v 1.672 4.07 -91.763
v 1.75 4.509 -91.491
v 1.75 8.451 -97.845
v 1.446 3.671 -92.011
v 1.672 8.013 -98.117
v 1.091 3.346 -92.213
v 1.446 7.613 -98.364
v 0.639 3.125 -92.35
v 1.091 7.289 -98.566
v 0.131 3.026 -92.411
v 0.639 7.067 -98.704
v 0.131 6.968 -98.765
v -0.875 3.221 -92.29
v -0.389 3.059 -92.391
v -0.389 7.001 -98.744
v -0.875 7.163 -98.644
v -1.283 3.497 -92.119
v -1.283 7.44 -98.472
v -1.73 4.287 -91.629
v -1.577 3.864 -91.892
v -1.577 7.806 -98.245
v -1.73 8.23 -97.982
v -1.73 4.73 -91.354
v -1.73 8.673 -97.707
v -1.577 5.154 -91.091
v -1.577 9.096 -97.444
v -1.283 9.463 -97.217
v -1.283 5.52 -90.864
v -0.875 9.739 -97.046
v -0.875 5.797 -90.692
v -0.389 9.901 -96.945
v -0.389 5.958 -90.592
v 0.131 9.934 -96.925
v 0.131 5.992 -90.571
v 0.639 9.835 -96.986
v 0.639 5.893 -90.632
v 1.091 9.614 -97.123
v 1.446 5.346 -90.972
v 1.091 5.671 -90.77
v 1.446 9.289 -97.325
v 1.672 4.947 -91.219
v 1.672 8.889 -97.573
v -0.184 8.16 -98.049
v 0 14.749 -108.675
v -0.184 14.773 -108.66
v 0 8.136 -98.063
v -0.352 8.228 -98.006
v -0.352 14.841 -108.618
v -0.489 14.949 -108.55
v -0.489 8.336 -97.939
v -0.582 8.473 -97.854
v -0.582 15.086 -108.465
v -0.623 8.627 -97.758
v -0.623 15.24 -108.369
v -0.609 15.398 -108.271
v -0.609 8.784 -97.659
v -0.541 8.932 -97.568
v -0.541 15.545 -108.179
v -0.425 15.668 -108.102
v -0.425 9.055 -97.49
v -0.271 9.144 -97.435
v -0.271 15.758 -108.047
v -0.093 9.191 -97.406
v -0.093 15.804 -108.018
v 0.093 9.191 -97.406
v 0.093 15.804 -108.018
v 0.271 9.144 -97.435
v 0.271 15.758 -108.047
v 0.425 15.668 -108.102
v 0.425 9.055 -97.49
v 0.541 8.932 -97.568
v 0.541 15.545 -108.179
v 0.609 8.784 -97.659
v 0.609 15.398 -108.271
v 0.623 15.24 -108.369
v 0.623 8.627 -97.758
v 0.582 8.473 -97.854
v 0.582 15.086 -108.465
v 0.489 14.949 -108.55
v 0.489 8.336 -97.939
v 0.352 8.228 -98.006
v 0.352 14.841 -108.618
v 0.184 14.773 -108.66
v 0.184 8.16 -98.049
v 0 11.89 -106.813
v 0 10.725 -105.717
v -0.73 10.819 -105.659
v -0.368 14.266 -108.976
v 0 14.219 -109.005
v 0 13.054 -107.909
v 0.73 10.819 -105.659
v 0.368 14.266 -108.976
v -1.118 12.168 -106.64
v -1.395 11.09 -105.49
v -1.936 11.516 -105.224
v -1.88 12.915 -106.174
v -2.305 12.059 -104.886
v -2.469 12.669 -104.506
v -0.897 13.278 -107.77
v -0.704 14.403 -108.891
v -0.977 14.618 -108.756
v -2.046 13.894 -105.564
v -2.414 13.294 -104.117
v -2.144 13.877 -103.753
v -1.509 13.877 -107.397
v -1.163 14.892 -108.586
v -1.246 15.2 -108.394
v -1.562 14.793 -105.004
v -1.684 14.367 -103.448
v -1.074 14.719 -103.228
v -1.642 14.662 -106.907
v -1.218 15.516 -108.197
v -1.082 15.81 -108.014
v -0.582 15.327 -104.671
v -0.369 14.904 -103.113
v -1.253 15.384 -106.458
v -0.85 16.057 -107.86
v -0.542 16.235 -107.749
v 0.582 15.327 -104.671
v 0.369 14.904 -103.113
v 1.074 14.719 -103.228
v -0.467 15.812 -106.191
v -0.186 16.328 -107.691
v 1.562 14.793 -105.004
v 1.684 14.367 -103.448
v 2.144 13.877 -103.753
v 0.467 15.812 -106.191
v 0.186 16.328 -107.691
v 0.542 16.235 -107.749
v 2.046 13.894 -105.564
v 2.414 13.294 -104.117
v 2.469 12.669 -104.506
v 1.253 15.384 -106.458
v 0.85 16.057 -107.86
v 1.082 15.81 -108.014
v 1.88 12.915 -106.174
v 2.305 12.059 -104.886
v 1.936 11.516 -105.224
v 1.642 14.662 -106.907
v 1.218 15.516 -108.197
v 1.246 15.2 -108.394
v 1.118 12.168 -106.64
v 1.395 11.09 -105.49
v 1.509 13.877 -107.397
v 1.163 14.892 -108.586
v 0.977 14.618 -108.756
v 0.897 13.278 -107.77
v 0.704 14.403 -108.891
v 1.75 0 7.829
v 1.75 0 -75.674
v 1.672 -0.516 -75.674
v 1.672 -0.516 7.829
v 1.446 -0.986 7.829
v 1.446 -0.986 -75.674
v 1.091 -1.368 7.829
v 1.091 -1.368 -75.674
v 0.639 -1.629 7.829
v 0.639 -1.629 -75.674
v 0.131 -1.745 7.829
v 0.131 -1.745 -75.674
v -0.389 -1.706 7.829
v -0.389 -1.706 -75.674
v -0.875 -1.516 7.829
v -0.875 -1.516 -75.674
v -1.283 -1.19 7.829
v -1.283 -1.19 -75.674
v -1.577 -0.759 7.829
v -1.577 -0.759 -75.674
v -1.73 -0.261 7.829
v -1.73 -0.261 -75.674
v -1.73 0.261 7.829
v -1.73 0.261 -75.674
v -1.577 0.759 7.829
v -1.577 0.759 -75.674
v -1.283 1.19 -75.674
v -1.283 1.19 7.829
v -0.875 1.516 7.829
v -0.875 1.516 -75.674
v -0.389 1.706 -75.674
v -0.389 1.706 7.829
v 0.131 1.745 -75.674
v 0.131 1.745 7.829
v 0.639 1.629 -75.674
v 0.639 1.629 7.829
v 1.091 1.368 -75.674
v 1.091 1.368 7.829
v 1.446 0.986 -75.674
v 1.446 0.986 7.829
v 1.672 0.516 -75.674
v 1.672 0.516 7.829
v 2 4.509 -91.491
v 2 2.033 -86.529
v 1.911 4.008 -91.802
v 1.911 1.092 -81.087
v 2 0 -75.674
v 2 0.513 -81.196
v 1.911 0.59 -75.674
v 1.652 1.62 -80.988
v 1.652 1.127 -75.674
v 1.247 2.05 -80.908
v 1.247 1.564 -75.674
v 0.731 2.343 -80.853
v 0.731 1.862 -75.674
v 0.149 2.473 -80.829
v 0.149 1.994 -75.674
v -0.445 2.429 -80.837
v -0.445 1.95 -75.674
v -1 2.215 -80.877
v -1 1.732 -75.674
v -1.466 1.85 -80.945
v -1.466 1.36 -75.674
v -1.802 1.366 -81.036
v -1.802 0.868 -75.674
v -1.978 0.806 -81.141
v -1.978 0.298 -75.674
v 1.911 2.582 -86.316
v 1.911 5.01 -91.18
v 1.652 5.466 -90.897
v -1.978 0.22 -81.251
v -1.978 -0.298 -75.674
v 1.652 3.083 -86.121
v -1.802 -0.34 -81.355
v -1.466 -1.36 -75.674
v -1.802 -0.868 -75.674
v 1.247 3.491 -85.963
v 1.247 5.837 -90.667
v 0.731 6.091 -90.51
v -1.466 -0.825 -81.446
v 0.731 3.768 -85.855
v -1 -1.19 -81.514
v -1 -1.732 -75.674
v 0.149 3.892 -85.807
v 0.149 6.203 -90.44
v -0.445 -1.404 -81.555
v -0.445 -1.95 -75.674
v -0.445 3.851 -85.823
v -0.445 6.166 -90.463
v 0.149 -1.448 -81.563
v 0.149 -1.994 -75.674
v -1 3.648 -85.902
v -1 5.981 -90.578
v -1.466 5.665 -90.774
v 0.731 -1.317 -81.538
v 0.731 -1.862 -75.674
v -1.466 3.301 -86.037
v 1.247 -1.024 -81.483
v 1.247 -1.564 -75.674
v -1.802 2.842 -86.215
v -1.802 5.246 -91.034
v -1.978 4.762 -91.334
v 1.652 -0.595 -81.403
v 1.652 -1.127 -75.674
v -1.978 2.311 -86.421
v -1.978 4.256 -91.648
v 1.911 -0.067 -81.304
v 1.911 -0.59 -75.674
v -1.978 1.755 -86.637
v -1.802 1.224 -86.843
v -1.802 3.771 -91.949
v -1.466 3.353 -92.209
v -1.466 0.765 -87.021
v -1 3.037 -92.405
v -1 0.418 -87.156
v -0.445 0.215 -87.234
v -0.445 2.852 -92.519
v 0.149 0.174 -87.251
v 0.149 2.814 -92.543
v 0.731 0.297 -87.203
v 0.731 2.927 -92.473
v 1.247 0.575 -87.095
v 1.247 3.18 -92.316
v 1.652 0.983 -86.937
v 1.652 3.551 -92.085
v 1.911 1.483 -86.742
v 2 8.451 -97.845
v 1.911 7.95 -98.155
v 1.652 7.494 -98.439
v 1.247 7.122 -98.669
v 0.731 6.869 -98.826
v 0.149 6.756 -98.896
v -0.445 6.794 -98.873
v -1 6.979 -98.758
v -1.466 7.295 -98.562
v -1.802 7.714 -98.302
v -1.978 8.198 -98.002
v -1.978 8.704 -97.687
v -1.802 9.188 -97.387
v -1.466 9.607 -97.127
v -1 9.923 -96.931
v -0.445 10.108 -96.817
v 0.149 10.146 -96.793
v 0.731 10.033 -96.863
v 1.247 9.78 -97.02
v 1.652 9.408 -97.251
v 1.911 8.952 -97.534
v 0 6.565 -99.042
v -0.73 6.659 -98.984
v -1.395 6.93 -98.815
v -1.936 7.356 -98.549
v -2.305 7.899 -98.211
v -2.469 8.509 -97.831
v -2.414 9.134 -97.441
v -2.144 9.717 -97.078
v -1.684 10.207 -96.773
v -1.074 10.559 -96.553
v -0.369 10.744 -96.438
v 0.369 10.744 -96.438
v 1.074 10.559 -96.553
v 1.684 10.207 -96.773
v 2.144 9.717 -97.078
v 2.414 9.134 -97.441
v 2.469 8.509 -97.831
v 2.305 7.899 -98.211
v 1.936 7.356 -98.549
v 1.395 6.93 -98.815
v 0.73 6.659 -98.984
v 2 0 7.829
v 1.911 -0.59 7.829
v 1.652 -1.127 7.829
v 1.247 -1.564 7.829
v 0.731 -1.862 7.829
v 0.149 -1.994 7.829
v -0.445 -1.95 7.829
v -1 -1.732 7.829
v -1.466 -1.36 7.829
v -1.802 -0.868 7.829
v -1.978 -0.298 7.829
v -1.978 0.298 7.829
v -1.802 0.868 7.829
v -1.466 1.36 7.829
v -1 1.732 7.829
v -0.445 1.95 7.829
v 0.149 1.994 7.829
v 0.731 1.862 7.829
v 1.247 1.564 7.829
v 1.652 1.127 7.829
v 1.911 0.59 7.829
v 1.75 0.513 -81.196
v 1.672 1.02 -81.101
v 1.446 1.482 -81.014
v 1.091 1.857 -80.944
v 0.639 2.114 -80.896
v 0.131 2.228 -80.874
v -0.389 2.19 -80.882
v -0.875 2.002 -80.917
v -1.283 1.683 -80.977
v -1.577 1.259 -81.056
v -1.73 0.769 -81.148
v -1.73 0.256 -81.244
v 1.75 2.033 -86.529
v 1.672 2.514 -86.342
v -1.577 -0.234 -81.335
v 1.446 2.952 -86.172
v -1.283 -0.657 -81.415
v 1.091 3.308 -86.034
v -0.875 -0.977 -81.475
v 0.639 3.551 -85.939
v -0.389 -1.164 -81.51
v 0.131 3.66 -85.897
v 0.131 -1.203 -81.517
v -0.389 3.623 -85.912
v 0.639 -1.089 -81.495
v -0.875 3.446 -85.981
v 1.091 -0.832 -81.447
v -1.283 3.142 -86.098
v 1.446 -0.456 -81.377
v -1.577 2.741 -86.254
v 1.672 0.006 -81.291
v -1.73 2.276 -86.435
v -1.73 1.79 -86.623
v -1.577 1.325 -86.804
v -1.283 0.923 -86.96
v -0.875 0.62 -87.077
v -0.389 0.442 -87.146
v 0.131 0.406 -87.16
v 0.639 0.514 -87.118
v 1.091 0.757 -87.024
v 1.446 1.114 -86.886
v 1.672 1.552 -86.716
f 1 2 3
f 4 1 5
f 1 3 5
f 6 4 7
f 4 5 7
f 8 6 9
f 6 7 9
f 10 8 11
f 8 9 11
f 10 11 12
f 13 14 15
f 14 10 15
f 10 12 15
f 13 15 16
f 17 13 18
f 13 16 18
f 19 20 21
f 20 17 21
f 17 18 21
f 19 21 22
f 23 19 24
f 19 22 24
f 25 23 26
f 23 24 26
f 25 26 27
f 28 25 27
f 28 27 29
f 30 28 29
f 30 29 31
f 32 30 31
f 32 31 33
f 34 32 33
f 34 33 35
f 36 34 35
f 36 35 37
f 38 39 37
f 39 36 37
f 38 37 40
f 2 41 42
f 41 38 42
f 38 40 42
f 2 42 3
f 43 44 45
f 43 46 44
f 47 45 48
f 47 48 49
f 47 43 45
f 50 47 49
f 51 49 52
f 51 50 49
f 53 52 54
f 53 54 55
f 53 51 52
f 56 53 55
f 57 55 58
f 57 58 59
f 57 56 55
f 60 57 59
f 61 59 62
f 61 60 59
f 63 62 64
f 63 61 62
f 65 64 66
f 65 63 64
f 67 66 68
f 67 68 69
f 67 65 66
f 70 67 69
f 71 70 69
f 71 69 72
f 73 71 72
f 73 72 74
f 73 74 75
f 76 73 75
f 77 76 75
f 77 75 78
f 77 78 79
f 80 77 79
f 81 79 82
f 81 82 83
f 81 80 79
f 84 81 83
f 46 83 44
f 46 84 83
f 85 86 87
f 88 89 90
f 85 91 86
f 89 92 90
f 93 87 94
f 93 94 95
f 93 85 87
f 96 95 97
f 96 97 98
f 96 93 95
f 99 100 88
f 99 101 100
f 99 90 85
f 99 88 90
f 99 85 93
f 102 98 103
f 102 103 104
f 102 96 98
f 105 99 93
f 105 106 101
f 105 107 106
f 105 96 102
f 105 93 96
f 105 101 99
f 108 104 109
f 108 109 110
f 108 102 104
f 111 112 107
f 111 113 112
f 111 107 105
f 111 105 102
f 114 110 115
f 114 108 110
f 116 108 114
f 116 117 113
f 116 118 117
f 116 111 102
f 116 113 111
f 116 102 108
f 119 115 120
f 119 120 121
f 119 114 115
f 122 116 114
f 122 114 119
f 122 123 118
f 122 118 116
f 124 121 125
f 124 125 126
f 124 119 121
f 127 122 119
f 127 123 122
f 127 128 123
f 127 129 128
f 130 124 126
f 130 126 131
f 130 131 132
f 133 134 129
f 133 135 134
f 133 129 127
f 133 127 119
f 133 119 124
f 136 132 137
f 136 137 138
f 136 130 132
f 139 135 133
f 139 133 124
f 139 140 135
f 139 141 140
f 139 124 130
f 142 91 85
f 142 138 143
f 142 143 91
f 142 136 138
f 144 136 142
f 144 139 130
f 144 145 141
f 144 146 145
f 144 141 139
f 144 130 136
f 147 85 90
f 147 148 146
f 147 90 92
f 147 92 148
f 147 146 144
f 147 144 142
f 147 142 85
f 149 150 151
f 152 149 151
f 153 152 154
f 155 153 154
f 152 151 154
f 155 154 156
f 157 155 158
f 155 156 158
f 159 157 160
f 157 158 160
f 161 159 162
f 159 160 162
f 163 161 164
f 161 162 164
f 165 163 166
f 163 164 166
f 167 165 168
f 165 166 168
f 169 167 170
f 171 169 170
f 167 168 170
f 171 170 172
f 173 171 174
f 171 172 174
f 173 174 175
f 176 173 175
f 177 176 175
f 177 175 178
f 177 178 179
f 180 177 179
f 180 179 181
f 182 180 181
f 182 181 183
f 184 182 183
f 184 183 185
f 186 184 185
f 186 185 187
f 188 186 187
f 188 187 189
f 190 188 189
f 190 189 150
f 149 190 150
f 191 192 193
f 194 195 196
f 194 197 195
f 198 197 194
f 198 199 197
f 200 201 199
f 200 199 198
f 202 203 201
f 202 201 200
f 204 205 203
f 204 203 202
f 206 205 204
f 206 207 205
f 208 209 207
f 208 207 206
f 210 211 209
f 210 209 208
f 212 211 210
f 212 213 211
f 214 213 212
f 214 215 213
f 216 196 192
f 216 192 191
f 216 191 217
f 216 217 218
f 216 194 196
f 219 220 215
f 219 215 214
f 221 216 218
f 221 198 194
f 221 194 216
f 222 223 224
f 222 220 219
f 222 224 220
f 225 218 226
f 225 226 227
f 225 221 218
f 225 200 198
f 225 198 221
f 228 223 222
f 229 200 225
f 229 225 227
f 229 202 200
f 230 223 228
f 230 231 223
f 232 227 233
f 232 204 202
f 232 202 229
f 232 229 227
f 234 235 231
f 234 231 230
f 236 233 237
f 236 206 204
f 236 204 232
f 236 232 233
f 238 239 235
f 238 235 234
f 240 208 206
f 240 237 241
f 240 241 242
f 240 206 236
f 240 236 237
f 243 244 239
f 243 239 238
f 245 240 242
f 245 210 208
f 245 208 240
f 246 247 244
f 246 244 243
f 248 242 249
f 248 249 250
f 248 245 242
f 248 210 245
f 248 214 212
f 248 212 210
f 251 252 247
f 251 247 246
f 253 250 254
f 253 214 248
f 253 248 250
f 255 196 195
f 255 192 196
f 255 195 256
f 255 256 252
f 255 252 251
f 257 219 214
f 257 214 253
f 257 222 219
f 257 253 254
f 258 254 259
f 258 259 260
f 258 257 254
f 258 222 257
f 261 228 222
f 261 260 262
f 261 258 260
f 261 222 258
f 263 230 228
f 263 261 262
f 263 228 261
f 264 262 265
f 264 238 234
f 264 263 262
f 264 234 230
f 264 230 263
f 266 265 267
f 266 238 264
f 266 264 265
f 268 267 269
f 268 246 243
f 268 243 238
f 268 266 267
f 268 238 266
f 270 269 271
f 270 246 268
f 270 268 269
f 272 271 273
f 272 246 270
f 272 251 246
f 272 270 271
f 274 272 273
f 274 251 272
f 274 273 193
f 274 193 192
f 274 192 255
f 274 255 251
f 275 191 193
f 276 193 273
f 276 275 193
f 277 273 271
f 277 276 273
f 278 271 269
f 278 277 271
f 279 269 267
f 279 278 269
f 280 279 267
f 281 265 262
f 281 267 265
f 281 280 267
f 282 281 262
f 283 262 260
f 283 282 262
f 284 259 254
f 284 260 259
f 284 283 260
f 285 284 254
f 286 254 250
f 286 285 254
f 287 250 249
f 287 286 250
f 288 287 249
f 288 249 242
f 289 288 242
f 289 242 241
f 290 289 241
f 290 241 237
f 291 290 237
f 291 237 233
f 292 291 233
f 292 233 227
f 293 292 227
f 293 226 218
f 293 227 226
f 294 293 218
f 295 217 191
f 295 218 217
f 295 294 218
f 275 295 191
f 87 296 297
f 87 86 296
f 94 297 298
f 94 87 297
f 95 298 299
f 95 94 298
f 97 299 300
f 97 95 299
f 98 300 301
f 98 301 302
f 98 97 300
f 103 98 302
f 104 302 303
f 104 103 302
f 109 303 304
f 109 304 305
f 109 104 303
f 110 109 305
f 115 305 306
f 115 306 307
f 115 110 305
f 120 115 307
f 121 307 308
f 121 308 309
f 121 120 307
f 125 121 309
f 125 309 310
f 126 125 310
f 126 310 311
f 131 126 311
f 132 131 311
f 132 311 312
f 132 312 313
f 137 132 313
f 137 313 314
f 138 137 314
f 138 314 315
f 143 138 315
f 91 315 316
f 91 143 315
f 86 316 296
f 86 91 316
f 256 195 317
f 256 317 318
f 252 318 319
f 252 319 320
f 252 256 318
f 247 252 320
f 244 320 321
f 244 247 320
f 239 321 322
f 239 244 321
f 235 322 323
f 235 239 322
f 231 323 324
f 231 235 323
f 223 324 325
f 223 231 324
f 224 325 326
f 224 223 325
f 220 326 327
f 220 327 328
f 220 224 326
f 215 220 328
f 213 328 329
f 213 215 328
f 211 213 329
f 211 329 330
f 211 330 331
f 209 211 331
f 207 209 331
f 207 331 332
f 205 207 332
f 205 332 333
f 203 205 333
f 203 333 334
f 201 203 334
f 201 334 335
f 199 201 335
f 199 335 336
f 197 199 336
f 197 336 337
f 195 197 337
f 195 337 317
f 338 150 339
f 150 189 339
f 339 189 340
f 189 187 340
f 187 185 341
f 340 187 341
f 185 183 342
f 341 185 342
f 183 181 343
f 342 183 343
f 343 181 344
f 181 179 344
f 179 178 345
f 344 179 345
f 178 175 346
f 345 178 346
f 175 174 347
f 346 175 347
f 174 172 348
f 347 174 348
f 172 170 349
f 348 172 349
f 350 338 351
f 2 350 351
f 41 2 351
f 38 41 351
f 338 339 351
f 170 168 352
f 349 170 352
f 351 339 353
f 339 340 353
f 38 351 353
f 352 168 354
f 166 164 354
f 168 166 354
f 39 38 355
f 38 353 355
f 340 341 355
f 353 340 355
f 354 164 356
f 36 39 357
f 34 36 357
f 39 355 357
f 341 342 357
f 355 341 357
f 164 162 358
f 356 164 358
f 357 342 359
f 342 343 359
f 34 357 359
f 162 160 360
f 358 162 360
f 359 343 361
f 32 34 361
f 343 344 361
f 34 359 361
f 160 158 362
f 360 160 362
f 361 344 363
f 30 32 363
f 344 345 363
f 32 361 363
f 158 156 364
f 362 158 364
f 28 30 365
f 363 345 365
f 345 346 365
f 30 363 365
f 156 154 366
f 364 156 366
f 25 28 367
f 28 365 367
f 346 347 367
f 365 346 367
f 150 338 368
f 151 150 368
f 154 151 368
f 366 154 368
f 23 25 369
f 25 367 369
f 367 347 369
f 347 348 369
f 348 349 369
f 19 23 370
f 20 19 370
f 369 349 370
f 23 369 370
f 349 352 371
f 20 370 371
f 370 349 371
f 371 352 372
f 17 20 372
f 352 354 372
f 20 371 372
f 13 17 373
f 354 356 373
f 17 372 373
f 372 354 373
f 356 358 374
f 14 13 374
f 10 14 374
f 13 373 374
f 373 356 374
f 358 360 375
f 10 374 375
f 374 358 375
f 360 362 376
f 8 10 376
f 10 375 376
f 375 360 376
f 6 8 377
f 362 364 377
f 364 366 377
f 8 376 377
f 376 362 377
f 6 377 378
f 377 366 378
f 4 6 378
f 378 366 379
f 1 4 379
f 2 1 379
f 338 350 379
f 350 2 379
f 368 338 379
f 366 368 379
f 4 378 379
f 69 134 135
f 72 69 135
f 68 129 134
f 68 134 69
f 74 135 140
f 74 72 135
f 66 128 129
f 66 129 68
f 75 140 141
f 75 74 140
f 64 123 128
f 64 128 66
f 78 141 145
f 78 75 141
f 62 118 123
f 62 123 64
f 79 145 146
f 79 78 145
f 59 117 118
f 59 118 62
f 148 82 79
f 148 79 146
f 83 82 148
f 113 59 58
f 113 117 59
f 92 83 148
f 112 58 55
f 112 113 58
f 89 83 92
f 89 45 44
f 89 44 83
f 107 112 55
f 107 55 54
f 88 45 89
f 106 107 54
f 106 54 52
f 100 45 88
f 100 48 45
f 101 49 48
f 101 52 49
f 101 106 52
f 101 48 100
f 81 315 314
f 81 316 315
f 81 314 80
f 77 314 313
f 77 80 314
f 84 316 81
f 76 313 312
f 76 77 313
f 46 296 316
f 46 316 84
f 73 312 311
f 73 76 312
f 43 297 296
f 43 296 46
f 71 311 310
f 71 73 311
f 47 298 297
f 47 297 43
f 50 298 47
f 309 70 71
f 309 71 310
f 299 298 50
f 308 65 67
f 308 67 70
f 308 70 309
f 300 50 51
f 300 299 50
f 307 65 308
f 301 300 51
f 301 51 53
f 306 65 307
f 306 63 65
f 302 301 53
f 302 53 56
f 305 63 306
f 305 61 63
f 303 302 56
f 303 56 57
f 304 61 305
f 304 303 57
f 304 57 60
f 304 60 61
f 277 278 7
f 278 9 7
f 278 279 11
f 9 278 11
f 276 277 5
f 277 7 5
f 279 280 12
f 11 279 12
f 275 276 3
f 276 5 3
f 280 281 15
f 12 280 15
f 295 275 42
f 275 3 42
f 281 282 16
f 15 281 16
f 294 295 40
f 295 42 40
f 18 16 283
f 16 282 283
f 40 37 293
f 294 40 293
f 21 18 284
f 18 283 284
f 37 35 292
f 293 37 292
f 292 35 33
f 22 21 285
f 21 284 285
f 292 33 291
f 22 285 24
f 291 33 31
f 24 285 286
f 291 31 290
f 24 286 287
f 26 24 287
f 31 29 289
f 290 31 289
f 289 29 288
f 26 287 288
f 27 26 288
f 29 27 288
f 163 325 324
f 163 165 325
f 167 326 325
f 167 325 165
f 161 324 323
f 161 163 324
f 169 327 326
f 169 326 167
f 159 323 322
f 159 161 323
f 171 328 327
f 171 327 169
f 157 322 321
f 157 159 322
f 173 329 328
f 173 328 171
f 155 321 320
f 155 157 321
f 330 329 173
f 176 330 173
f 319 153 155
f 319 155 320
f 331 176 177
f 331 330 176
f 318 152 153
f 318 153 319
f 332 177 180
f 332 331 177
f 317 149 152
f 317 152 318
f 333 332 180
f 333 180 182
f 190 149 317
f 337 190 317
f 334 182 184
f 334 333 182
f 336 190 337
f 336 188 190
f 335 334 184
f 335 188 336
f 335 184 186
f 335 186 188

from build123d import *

# Parameters (mm, degrees)
SKETCH2_R   = 2
SKETCH2_R_2 = 1.75


with BuildPart() as part:
    # Sweep1: sweep along a path in Sketch1
    with BuildLine(Plane(origin=(0, 0, 0), x_dir=(0, 0, -1), z_dir=(1, 0, 0))) as sweep1_path:
        Line((-7.82934114, 0), (75.673647507, 0))
        ThreePointArc((75.673647507, 0), (83.897502379, 1.149207792), (91.491296044, 4.508785931))
        Line((91.491296044, 4.508785931), (97.844646472, 8.451127156))
    # Sketch2 → Sweep1 (sweep)
    with BuildSketch(Plane.XY):
        Circle(SKETCH2_R)
        Circle(SKETCH2_R_2, mode=Mode.SUBTRACT)
    sweep(path=sweep1_path.line)


with BuildPart() as body_2:
    # Sketch3 → Revolve1 (revolve)
    with BuildSketch(Plane(origin=(0, 0, 0), x_dir=(0, 0, -1), z_dir=(1, 0, 0))):
        Polygon((98.063364296, 8.135998244), (99.042203981, 6.565358226), (105.717334971, 10.725371372), (109.005369397, 14.219041289), (108.674940143, 14.749245996), align=None)
    revolve(axis=Axis((0, -57.121033946, 7.82934114), (0, 0.528906522, -0.848680087)))


solid = Compound([part.part, body_2.part])
